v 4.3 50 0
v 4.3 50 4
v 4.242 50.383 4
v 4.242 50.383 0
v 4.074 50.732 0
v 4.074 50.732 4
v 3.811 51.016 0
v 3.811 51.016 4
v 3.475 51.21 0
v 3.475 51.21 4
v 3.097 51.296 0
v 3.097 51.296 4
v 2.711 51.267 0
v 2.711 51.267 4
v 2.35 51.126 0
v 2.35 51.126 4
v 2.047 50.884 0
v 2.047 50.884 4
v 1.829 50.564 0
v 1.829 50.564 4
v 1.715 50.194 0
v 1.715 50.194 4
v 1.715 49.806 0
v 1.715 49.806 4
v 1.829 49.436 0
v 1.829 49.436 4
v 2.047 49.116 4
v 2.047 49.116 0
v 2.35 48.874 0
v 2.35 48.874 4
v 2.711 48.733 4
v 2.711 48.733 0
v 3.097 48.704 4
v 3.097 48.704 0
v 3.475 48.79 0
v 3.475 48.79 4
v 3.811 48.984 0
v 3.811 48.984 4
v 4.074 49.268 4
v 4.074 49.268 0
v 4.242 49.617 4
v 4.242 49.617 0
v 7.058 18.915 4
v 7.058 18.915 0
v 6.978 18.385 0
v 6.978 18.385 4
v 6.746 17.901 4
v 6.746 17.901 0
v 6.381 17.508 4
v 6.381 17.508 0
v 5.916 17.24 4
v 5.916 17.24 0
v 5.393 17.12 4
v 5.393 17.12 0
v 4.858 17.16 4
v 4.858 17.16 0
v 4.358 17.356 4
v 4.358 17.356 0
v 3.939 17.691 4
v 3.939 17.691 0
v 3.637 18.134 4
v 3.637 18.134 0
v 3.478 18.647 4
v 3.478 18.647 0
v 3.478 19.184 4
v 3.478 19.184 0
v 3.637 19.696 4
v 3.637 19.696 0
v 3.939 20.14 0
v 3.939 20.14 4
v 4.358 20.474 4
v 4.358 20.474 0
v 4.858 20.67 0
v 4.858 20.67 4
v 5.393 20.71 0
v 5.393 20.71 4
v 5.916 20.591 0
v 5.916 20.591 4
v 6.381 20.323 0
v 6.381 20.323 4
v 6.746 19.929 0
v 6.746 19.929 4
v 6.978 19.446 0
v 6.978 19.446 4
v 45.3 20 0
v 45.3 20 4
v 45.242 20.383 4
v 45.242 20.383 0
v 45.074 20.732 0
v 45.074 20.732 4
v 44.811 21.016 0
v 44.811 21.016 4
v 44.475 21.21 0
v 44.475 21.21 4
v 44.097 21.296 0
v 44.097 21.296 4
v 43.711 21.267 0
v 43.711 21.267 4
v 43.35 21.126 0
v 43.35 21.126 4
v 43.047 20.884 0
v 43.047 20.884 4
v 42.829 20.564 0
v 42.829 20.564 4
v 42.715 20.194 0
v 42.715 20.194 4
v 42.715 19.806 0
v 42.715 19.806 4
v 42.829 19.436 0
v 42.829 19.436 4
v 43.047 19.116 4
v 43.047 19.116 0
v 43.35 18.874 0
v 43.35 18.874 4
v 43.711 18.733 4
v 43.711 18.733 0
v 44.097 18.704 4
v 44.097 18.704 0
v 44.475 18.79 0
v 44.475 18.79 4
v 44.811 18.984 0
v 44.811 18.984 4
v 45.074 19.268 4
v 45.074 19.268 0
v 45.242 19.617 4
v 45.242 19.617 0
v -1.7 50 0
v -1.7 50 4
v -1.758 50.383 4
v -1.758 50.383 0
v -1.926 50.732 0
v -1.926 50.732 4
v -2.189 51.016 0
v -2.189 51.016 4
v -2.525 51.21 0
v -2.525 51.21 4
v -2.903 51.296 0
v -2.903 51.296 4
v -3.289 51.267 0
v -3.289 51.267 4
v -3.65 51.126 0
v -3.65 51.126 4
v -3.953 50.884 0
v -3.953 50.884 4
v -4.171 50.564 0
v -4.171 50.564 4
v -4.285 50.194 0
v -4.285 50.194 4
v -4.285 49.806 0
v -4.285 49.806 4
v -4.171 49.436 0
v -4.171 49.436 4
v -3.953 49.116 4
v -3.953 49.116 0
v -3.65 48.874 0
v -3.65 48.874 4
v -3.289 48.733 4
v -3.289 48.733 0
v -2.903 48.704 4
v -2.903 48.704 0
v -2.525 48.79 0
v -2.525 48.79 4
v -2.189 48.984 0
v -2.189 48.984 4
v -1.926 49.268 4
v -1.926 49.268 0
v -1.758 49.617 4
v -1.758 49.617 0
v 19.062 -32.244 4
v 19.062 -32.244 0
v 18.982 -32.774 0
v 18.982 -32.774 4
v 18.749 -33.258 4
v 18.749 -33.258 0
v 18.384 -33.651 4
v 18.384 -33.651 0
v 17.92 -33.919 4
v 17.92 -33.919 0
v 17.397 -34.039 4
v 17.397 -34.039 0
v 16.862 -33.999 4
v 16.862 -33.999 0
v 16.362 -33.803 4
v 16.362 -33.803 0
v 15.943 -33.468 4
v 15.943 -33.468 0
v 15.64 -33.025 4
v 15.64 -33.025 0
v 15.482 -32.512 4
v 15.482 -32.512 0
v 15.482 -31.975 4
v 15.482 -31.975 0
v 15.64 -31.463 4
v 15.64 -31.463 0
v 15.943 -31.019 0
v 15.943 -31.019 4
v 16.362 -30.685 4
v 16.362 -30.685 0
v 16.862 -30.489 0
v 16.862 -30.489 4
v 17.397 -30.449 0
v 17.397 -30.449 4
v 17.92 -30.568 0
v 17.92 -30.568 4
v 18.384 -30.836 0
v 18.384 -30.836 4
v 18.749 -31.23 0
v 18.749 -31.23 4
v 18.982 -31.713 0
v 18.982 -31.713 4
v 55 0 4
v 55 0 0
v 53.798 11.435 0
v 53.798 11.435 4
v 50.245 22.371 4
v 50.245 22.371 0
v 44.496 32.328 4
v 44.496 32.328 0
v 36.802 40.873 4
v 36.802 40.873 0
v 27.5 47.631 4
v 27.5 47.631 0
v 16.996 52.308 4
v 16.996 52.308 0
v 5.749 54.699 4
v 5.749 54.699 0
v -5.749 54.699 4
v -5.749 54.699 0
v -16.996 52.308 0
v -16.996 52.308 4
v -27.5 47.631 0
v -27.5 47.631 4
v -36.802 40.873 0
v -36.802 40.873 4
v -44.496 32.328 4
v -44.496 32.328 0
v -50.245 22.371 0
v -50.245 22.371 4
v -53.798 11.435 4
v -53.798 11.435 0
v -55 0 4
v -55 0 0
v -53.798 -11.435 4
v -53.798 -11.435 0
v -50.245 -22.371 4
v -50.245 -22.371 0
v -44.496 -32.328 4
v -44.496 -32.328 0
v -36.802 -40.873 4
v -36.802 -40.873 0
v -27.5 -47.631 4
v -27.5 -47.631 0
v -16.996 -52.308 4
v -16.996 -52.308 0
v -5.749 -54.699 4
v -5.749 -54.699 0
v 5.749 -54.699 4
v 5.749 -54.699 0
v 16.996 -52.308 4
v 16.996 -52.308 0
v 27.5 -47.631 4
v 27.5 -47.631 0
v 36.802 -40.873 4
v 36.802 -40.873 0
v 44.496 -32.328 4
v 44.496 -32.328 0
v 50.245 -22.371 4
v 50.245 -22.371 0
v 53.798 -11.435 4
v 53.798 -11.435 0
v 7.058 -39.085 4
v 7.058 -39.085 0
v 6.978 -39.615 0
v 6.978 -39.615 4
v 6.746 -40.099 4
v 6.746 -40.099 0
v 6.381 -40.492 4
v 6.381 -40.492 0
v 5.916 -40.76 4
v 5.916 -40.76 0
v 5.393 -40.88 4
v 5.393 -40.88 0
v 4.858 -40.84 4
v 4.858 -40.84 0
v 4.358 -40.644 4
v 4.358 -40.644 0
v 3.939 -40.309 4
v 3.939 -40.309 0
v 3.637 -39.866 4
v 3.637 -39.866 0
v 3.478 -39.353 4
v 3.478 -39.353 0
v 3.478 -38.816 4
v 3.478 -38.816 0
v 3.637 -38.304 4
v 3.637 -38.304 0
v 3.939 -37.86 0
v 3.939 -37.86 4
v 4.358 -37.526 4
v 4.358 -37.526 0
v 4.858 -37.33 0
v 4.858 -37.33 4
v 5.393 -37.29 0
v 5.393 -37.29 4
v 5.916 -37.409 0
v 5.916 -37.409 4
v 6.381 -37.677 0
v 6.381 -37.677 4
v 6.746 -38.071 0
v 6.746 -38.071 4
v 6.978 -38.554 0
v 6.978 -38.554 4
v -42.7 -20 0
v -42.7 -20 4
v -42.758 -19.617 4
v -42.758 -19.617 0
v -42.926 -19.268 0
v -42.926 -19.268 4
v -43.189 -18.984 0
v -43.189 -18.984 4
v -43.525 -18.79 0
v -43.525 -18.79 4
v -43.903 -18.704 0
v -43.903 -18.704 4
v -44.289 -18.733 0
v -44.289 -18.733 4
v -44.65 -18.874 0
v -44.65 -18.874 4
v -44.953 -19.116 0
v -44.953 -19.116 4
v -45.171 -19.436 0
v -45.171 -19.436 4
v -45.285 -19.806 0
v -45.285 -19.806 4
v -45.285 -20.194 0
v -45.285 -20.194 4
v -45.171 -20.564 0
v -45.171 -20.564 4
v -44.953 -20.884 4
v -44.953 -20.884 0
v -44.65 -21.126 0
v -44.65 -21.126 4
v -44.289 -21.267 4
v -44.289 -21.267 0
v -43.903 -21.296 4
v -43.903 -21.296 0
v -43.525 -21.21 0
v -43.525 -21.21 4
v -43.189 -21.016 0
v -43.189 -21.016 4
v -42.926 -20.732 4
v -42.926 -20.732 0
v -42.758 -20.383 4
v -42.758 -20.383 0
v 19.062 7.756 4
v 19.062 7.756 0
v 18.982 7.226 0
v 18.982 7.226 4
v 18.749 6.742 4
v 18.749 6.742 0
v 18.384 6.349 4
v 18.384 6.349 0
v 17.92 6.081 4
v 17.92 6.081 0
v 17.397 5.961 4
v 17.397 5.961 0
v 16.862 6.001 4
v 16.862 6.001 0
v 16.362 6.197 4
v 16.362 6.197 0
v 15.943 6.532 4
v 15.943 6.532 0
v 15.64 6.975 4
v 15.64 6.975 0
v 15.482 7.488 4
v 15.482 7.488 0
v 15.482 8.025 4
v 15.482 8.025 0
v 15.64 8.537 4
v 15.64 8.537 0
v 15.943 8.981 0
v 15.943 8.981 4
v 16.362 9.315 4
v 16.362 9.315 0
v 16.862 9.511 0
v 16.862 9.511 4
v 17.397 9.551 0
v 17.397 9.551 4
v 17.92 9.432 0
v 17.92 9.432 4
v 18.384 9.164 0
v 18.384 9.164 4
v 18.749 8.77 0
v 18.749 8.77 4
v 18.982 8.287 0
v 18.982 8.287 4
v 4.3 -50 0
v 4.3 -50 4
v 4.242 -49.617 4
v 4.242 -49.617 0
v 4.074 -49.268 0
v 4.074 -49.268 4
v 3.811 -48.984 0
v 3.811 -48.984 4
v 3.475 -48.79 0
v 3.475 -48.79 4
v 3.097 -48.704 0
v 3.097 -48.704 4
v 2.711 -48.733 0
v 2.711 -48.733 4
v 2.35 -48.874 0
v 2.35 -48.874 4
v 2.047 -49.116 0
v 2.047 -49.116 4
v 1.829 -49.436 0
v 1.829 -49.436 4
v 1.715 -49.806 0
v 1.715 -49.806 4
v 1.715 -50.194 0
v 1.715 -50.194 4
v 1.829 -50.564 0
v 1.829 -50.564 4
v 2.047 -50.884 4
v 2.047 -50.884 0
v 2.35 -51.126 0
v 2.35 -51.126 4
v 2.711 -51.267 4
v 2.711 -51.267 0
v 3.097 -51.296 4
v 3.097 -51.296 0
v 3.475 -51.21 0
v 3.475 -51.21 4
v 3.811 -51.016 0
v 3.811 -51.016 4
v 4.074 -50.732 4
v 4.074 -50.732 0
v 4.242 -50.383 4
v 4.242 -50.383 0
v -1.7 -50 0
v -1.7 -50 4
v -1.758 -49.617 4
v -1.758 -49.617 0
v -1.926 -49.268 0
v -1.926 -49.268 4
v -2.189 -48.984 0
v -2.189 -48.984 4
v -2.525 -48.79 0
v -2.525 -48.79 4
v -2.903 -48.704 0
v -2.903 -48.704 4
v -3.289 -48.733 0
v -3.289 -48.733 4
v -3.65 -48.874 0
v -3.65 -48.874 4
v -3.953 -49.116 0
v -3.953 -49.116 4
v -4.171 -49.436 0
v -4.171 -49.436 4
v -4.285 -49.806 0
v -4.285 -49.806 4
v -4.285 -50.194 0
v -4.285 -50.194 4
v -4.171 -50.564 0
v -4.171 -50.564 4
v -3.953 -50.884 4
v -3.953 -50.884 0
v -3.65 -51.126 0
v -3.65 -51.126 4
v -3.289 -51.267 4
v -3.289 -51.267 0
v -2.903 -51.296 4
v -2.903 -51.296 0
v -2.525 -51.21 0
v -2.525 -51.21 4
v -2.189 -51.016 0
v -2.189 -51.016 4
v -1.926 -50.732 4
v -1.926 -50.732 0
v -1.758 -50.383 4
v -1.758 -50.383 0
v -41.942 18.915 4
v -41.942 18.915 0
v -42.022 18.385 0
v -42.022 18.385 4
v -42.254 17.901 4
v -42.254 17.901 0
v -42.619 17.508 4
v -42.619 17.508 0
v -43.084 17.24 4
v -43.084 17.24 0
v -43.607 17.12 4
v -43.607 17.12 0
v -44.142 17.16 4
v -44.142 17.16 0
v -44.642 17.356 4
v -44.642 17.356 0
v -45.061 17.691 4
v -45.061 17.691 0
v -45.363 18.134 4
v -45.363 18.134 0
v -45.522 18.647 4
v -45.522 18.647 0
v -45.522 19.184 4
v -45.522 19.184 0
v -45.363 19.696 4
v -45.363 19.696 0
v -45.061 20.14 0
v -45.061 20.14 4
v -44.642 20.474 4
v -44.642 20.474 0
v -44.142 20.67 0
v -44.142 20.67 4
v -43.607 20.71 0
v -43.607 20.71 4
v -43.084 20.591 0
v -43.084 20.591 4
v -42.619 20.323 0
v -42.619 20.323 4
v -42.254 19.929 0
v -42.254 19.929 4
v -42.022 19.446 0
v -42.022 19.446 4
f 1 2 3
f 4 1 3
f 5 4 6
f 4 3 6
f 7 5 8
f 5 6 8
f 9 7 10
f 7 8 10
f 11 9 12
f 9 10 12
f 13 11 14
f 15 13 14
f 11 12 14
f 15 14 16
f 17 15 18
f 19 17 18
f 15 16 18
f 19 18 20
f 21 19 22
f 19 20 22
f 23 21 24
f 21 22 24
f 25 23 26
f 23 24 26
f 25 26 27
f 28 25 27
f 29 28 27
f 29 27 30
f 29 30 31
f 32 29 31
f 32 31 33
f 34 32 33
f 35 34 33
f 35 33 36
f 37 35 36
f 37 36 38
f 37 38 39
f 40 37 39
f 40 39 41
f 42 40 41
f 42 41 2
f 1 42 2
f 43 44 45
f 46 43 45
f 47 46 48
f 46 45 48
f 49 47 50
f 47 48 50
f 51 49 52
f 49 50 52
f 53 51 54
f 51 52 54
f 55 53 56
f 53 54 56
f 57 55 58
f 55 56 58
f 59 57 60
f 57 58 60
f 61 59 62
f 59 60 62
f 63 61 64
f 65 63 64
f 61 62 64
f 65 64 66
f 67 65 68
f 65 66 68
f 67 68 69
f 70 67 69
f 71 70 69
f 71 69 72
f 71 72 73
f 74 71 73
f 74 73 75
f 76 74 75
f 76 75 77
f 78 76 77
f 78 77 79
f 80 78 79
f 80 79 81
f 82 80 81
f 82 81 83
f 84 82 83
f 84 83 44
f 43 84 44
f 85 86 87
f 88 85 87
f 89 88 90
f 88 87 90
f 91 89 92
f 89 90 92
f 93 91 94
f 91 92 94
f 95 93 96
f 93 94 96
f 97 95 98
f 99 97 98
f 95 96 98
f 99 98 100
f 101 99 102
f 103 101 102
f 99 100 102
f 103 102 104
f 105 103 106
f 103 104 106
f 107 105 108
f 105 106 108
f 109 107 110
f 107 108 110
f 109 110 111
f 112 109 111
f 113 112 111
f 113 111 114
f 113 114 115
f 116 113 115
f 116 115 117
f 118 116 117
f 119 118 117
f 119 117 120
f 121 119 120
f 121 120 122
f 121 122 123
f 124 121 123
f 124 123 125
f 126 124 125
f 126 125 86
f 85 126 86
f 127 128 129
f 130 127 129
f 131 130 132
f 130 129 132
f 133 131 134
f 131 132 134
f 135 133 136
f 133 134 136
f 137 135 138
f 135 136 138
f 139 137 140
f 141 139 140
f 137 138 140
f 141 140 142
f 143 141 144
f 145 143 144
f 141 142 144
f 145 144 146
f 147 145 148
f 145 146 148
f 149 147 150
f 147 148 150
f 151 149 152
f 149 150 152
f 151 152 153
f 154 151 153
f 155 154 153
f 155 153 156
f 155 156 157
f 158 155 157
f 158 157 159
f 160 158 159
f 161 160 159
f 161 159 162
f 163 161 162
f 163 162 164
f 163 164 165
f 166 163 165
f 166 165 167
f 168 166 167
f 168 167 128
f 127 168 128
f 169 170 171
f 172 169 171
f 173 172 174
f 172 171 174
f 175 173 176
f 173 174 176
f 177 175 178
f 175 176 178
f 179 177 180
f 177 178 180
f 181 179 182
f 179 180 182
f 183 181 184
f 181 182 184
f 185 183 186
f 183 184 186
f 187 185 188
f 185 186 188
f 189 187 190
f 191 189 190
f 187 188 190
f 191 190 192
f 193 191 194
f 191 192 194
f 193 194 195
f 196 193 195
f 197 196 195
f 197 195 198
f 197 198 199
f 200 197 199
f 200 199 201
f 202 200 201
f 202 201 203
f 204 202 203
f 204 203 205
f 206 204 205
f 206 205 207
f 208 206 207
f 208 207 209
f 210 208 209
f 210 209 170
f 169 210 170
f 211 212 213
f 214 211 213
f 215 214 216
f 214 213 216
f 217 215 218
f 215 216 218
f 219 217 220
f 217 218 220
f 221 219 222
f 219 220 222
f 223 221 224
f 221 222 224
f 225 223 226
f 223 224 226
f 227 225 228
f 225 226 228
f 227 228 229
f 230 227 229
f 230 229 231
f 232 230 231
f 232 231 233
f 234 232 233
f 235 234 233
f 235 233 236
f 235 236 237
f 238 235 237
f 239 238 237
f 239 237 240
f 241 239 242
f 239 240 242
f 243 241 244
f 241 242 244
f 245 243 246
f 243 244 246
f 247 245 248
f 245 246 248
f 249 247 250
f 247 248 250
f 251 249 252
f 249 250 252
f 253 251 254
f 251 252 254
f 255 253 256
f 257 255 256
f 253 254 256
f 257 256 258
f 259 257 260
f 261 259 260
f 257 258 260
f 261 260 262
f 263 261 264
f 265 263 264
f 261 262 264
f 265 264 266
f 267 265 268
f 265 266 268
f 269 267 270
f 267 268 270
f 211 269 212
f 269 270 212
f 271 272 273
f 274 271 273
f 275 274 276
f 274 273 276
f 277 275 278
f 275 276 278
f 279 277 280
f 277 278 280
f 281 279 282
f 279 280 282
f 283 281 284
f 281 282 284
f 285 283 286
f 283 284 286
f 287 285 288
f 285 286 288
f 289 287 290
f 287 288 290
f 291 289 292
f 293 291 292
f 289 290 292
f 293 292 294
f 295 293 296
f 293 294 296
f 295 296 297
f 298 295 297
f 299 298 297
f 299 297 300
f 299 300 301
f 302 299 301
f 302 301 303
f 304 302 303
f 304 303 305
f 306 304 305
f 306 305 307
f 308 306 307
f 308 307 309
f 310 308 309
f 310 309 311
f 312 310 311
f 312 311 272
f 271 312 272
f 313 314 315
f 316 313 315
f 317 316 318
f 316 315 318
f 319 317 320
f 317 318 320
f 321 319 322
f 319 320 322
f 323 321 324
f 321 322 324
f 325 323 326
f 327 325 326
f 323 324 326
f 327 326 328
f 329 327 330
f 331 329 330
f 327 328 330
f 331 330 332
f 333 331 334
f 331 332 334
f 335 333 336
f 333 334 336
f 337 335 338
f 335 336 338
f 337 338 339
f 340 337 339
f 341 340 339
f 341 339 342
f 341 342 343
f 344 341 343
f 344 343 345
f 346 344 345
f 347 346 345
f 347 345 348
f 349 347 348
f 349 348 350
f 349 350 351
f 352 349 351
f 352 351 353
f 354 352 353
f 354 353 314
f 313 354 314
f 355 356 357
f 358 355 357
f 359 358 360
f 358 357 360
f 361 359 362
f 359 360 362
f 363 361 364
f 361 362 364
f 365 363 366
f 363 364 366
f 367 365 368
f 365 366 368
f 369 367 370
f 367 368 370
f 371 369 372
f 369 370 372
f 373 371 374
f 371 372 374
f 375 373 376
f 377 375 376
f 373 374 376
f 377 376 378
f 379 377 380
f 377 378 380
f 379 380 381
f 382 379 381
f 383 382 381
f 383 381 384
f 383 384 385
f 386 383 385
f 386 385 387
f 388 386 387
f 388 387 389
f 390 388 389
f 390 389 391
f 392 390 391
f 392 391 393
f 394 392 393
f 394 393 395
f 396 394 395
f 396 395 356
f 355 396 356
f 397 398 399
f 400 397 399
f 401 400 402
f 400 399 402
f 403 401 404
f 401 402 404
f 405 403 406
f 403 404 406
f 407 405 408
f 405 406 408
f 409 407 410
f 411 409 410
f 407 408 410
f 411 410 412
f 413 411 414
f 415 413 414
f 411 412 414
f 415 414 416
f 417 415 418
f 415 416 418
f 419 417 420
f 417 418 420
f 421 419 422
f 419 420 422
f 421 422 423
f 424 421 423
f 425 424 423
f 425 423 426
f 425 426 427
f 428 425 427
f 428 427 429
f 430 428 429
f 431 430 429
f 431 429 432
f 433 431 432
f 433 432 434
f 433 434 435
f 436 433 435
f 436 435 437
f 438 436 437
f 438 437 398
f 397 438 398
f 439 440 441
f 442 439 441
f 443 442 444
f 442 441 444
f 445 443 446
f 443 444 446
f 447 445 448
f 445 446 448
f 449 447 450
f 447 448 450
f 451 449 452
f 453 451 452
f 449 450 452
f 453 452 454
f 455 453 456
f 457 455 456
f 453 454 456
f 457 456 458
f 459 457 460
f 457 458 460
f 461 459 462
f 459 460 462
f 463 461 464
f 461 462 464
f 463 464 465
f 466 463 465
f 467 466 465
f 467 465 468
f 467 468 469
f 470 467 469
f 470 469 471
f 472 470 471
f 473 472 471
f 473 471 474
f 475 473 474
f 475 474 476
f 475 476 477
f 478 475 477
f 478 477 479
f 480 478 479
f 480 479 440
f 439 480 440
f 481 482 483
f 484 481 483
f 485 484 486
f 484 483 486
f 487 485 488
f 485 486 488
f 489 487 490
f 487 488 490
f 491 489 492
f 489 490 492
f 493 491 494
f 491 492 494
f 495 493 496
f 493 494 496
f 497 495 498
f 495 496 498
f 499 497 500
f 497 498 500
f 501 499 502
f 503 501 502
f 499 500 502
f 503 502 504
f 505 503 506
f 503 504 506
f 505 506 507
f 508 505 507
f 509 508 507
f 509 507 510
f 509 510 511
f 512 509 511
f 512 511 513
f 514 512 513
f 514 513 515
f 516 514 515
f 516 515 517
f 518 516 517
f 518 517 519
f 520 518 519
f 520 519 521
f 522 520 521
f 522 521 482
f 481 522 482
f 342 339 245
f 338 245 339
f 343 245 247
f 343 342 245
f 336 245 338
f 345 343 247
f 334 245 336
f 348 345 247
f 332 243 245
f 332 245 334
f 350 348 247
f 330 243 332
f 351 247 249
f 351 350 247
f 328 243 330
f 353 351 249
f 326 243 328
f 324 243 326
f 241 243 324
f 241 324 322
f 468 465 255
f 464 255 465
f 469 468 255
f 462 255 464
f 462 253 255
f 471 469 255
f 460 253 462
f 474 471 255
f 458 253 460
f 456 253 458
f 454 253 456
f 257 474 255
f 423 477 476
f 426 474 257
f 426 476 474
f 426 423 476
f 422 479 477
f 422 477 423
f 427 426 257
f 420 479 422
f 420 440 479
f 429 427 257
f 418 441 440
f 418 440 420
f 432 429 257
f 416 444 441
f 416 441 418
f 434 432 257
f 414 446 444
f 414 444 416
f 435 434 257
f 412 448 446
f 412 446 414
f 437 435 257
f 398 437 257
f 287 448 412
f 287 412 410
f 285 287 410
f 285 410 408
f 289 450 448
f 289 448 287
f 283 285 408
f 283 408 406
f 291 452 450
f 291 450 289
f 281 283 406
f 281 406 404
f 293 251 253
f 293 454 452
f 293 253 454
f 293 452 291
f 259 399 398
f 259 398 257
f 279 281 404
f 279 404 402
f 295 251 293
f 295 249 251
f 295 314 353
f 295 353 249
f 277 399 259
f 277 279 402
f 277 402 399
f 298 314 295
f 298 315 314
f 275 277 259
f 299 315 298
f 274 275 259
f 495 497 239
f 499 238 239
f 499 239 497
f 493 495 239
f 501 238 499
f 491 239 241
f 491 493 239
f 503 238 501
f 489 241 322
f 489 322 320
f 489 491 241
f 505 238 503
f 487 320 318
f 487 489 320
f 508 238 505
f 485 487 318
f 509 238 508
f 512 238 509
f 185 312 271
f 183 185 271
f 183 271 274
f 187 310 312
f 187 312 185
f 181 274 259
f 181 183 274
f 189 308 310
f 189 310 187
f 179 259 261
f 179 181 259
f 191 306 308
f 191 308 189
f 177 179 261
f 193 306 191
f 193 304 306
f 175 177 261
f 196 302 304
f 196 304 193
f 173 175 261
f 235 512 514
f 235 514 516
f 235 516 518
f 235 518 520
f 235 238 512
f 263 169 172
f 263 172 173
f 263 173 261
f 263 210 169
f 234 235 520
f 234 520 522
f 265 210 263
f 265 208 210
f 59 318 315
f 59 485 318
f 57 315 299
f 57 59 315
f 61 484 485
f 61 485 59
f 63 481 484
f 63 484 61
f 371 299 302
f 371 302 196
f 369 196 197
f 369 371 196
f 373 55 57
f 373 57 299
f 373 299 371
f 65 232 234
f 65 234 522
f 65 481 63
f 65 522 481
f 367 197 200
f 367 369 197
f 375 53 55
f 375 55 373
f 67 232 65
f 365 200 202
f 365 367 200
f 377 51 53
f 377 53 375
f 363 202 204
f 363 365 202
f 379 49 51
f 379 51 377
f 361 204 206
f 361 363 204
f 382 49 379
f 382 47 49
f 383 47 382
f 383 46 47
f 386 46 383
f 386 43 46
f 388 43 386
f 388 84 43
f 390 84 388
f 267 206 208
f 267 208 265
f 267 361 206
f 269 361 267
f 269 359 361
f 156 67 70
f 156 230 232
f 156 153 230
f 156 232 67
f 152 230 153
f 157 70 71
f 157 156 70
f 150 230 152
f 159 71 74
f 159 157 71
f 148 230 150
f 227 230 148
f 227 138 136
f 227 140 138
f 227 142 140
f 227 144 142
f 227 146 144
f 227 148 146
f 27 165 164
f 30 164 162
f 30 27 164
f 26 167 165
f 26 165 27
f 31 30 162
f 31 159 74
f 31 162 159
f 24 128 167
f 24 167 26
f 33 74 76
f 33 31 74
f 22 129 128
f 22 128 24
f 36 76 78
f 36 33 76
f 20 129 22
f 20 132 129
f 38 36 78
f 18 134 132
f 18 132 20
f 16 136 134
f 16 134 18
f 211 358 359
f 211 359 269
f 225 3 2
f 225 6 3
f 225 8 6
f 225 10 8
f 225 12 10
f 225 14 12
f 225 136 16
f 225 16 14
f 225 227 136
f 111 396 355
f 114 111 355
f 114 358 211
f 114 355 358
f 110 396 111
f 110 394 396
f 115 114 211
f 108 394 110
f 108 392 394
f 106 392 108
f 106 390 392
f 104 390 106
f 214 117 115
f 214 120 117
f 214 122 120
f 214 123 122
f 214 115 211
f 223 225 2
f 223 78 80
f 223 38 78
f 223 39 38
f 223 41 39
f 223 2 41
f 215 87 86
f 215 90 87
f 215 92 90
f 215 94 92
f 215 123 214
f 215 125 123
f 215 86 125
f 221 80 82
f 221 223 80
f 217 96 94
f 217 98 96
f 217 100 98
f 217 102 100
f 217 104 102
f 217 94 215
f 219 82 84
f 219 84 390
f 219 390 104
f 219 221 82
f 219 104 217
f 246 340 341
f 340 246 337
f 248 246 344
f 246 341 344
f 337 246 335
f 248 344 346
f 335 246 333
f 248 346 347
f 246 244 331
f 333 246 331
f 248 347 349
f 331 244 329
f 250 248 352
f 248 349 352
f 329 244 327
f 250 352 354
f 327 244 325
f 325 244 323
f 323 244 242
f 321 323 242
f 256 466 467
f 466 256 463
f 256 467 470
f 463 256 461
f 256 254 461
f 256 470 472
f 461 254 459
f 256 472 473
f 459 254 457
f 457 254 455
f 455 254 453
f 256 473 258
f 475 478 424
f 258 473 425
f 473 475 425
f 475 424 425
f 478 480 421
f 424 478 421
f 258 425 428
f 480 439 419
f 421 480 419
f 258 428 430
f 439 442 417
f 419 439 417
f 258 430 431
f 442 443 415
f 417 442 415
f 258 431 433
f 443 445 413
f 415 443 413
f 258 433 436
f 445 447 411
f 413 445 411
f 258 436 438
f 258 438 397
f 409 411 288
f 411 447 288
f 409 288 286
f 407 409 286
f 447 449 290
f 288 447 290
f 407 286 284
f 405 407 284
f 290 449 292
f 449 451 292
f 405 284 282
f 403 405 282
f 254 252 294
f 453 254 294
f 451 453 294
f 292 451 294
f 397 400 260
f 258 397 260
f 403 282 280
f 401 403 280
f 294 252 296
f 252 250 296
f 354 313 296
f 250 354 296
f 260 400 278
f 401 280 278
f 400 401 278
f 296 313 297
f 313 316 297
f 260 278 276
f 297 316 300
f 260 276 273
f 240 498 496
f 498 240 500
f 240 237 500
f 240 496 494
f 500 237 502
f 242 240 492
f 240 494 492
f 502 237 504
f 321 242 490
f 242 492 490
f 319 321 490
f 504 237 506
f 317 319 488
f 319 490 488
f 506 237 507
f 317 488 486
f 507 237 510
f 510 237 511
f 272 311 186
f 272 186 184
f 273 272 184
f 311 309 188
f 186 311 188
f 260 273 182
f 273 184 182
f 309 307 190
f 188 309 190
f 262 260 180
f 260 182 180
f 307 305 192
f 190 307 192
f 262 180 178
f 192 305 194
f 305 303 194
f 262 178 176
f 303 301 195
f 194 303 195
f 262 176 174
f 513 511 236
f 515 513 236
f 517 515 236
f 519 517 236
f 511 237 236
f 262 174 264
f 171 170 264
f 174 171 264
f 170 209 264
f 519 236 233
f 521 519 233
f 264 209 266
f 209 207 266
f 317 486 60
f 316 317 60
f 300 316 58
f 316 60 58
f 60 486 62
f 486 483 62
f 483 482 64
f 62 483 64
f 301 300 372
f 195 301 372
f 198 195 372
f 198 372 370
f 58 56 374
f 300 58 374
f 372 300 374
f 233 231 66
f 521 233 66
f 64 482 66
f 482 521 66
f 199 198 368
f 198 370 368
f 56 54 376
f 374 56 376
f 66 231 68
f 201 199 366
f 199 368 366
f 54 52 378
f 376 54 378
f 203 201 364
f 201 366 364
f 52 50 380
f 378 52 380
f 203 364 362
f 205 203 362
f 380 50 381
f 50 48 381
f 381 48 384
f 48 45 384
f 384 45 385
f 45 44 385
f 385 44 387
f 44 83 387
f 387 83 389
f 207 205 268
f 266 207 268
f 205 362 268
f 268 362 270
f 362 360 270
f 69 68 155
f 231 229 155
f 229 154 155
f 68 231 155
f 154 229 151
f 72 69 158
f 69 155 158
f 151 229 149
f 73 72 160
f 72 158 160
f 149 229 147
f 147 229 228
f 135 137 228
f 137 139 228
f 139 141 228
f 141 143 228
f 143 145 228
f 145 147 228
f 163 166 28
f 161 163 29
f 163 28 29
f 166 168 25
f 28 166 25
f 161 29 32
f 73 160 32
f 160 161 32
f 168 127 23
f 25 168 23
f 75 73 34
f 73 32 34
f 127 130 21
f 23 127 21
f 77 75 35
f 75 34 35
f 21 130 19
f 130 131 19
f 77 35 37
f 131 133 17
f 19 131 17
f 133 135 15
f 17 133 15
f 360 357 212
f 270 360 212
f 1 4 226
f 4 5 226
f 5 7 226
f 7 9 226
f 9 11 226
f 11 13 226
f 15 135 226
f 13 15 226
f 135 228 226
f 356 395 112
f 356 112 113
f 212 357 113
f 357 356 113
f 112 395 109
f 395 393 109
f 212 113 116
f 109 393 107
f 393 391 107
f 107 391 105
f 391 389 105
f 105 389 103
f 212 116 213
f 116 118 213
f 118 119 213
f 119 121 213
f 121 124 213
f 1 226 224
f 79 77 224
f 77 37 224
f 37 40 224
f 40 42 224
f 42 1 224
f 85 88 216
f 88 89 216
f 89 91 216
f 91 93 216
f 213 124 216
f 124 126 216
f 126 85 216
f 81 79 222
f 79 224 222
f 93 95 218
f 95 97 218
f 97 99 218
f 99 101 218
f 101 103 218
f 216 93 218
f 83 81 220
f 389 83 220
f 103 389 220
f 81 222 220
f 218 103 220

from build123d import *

# Parameters (mm, degrees)
SKETCH_R        = 55
PAD_DEPTH       = 4
SKETCH003_R     = 1.3
POCKET001_DEPTH = 5
SKETCH004_R     = 1.3
POCKET_DEPTH    = 5
SKETCH005_R     = 1.8
POCKET002_DEPTH = 5


with BuildPart() as part:
    # Sketch → Pad (new body)
    with BuildSketch(Plane.XY):
        Circle(SKETCH_R)
    extrude(amount=PAD_DEPTH)

    # Sketch003 → Pocket001 (cut)
    with BuildSketch(Plane.XY.offset(4)):
        with Locations((-44, -20)):
            Circle(SKETCH003_R)
        with Locations((44, 20)):
            Circle(SKETCH003_R)
    extrude(amount=-POCKET001_DEPTH, mode=Mode.SUBTRACT)

    # Sketch004 (on Face3 of Pocket001) → Pocket (cut)
    with BuildSketch(Plane.XY.offset(4)):
        with Locations((3, -50)):
            Circle(SKETCH004_R)
        with Locations((-3, -50)):
            Circle(SKETCH004_R)
        with Locations((-3, 50)):
            Circle(SKETCH004_R)
        with Locations((3, 50)):
            Circle(SKETCH004_R)
    extrude(amount=-POCKET_DEPTH, mode=Mode.SUBTRACT)

    # Sketch005 (on Face2 of Pocket) → Pocket002 (cut)
    with BuildSketch(Plane(origin=(0, 0, 0), x_dir=(1, 0, 0), z_dir=(0, 0, -1))):
        with Locations((17.262171, 32.243663)):
            Circle(SKETCH005_R)
        with Locations((17.262171, -7.756337)):
            Circle(SKETCH005_R)
        with Locations((5.258312, 39.084725)):
            Circle(SKETCH005_R)
        with Locations((-43.741688, -18.915275)):
            Circle(SKETCH005_R)
        with Locations((5.258312, -18.915275)):
            Circle(SKETCH005_R)
    extrude(amount=-POCKET002_DEPTH, mode=Mode.SUBTRACT)


solid = part.part
